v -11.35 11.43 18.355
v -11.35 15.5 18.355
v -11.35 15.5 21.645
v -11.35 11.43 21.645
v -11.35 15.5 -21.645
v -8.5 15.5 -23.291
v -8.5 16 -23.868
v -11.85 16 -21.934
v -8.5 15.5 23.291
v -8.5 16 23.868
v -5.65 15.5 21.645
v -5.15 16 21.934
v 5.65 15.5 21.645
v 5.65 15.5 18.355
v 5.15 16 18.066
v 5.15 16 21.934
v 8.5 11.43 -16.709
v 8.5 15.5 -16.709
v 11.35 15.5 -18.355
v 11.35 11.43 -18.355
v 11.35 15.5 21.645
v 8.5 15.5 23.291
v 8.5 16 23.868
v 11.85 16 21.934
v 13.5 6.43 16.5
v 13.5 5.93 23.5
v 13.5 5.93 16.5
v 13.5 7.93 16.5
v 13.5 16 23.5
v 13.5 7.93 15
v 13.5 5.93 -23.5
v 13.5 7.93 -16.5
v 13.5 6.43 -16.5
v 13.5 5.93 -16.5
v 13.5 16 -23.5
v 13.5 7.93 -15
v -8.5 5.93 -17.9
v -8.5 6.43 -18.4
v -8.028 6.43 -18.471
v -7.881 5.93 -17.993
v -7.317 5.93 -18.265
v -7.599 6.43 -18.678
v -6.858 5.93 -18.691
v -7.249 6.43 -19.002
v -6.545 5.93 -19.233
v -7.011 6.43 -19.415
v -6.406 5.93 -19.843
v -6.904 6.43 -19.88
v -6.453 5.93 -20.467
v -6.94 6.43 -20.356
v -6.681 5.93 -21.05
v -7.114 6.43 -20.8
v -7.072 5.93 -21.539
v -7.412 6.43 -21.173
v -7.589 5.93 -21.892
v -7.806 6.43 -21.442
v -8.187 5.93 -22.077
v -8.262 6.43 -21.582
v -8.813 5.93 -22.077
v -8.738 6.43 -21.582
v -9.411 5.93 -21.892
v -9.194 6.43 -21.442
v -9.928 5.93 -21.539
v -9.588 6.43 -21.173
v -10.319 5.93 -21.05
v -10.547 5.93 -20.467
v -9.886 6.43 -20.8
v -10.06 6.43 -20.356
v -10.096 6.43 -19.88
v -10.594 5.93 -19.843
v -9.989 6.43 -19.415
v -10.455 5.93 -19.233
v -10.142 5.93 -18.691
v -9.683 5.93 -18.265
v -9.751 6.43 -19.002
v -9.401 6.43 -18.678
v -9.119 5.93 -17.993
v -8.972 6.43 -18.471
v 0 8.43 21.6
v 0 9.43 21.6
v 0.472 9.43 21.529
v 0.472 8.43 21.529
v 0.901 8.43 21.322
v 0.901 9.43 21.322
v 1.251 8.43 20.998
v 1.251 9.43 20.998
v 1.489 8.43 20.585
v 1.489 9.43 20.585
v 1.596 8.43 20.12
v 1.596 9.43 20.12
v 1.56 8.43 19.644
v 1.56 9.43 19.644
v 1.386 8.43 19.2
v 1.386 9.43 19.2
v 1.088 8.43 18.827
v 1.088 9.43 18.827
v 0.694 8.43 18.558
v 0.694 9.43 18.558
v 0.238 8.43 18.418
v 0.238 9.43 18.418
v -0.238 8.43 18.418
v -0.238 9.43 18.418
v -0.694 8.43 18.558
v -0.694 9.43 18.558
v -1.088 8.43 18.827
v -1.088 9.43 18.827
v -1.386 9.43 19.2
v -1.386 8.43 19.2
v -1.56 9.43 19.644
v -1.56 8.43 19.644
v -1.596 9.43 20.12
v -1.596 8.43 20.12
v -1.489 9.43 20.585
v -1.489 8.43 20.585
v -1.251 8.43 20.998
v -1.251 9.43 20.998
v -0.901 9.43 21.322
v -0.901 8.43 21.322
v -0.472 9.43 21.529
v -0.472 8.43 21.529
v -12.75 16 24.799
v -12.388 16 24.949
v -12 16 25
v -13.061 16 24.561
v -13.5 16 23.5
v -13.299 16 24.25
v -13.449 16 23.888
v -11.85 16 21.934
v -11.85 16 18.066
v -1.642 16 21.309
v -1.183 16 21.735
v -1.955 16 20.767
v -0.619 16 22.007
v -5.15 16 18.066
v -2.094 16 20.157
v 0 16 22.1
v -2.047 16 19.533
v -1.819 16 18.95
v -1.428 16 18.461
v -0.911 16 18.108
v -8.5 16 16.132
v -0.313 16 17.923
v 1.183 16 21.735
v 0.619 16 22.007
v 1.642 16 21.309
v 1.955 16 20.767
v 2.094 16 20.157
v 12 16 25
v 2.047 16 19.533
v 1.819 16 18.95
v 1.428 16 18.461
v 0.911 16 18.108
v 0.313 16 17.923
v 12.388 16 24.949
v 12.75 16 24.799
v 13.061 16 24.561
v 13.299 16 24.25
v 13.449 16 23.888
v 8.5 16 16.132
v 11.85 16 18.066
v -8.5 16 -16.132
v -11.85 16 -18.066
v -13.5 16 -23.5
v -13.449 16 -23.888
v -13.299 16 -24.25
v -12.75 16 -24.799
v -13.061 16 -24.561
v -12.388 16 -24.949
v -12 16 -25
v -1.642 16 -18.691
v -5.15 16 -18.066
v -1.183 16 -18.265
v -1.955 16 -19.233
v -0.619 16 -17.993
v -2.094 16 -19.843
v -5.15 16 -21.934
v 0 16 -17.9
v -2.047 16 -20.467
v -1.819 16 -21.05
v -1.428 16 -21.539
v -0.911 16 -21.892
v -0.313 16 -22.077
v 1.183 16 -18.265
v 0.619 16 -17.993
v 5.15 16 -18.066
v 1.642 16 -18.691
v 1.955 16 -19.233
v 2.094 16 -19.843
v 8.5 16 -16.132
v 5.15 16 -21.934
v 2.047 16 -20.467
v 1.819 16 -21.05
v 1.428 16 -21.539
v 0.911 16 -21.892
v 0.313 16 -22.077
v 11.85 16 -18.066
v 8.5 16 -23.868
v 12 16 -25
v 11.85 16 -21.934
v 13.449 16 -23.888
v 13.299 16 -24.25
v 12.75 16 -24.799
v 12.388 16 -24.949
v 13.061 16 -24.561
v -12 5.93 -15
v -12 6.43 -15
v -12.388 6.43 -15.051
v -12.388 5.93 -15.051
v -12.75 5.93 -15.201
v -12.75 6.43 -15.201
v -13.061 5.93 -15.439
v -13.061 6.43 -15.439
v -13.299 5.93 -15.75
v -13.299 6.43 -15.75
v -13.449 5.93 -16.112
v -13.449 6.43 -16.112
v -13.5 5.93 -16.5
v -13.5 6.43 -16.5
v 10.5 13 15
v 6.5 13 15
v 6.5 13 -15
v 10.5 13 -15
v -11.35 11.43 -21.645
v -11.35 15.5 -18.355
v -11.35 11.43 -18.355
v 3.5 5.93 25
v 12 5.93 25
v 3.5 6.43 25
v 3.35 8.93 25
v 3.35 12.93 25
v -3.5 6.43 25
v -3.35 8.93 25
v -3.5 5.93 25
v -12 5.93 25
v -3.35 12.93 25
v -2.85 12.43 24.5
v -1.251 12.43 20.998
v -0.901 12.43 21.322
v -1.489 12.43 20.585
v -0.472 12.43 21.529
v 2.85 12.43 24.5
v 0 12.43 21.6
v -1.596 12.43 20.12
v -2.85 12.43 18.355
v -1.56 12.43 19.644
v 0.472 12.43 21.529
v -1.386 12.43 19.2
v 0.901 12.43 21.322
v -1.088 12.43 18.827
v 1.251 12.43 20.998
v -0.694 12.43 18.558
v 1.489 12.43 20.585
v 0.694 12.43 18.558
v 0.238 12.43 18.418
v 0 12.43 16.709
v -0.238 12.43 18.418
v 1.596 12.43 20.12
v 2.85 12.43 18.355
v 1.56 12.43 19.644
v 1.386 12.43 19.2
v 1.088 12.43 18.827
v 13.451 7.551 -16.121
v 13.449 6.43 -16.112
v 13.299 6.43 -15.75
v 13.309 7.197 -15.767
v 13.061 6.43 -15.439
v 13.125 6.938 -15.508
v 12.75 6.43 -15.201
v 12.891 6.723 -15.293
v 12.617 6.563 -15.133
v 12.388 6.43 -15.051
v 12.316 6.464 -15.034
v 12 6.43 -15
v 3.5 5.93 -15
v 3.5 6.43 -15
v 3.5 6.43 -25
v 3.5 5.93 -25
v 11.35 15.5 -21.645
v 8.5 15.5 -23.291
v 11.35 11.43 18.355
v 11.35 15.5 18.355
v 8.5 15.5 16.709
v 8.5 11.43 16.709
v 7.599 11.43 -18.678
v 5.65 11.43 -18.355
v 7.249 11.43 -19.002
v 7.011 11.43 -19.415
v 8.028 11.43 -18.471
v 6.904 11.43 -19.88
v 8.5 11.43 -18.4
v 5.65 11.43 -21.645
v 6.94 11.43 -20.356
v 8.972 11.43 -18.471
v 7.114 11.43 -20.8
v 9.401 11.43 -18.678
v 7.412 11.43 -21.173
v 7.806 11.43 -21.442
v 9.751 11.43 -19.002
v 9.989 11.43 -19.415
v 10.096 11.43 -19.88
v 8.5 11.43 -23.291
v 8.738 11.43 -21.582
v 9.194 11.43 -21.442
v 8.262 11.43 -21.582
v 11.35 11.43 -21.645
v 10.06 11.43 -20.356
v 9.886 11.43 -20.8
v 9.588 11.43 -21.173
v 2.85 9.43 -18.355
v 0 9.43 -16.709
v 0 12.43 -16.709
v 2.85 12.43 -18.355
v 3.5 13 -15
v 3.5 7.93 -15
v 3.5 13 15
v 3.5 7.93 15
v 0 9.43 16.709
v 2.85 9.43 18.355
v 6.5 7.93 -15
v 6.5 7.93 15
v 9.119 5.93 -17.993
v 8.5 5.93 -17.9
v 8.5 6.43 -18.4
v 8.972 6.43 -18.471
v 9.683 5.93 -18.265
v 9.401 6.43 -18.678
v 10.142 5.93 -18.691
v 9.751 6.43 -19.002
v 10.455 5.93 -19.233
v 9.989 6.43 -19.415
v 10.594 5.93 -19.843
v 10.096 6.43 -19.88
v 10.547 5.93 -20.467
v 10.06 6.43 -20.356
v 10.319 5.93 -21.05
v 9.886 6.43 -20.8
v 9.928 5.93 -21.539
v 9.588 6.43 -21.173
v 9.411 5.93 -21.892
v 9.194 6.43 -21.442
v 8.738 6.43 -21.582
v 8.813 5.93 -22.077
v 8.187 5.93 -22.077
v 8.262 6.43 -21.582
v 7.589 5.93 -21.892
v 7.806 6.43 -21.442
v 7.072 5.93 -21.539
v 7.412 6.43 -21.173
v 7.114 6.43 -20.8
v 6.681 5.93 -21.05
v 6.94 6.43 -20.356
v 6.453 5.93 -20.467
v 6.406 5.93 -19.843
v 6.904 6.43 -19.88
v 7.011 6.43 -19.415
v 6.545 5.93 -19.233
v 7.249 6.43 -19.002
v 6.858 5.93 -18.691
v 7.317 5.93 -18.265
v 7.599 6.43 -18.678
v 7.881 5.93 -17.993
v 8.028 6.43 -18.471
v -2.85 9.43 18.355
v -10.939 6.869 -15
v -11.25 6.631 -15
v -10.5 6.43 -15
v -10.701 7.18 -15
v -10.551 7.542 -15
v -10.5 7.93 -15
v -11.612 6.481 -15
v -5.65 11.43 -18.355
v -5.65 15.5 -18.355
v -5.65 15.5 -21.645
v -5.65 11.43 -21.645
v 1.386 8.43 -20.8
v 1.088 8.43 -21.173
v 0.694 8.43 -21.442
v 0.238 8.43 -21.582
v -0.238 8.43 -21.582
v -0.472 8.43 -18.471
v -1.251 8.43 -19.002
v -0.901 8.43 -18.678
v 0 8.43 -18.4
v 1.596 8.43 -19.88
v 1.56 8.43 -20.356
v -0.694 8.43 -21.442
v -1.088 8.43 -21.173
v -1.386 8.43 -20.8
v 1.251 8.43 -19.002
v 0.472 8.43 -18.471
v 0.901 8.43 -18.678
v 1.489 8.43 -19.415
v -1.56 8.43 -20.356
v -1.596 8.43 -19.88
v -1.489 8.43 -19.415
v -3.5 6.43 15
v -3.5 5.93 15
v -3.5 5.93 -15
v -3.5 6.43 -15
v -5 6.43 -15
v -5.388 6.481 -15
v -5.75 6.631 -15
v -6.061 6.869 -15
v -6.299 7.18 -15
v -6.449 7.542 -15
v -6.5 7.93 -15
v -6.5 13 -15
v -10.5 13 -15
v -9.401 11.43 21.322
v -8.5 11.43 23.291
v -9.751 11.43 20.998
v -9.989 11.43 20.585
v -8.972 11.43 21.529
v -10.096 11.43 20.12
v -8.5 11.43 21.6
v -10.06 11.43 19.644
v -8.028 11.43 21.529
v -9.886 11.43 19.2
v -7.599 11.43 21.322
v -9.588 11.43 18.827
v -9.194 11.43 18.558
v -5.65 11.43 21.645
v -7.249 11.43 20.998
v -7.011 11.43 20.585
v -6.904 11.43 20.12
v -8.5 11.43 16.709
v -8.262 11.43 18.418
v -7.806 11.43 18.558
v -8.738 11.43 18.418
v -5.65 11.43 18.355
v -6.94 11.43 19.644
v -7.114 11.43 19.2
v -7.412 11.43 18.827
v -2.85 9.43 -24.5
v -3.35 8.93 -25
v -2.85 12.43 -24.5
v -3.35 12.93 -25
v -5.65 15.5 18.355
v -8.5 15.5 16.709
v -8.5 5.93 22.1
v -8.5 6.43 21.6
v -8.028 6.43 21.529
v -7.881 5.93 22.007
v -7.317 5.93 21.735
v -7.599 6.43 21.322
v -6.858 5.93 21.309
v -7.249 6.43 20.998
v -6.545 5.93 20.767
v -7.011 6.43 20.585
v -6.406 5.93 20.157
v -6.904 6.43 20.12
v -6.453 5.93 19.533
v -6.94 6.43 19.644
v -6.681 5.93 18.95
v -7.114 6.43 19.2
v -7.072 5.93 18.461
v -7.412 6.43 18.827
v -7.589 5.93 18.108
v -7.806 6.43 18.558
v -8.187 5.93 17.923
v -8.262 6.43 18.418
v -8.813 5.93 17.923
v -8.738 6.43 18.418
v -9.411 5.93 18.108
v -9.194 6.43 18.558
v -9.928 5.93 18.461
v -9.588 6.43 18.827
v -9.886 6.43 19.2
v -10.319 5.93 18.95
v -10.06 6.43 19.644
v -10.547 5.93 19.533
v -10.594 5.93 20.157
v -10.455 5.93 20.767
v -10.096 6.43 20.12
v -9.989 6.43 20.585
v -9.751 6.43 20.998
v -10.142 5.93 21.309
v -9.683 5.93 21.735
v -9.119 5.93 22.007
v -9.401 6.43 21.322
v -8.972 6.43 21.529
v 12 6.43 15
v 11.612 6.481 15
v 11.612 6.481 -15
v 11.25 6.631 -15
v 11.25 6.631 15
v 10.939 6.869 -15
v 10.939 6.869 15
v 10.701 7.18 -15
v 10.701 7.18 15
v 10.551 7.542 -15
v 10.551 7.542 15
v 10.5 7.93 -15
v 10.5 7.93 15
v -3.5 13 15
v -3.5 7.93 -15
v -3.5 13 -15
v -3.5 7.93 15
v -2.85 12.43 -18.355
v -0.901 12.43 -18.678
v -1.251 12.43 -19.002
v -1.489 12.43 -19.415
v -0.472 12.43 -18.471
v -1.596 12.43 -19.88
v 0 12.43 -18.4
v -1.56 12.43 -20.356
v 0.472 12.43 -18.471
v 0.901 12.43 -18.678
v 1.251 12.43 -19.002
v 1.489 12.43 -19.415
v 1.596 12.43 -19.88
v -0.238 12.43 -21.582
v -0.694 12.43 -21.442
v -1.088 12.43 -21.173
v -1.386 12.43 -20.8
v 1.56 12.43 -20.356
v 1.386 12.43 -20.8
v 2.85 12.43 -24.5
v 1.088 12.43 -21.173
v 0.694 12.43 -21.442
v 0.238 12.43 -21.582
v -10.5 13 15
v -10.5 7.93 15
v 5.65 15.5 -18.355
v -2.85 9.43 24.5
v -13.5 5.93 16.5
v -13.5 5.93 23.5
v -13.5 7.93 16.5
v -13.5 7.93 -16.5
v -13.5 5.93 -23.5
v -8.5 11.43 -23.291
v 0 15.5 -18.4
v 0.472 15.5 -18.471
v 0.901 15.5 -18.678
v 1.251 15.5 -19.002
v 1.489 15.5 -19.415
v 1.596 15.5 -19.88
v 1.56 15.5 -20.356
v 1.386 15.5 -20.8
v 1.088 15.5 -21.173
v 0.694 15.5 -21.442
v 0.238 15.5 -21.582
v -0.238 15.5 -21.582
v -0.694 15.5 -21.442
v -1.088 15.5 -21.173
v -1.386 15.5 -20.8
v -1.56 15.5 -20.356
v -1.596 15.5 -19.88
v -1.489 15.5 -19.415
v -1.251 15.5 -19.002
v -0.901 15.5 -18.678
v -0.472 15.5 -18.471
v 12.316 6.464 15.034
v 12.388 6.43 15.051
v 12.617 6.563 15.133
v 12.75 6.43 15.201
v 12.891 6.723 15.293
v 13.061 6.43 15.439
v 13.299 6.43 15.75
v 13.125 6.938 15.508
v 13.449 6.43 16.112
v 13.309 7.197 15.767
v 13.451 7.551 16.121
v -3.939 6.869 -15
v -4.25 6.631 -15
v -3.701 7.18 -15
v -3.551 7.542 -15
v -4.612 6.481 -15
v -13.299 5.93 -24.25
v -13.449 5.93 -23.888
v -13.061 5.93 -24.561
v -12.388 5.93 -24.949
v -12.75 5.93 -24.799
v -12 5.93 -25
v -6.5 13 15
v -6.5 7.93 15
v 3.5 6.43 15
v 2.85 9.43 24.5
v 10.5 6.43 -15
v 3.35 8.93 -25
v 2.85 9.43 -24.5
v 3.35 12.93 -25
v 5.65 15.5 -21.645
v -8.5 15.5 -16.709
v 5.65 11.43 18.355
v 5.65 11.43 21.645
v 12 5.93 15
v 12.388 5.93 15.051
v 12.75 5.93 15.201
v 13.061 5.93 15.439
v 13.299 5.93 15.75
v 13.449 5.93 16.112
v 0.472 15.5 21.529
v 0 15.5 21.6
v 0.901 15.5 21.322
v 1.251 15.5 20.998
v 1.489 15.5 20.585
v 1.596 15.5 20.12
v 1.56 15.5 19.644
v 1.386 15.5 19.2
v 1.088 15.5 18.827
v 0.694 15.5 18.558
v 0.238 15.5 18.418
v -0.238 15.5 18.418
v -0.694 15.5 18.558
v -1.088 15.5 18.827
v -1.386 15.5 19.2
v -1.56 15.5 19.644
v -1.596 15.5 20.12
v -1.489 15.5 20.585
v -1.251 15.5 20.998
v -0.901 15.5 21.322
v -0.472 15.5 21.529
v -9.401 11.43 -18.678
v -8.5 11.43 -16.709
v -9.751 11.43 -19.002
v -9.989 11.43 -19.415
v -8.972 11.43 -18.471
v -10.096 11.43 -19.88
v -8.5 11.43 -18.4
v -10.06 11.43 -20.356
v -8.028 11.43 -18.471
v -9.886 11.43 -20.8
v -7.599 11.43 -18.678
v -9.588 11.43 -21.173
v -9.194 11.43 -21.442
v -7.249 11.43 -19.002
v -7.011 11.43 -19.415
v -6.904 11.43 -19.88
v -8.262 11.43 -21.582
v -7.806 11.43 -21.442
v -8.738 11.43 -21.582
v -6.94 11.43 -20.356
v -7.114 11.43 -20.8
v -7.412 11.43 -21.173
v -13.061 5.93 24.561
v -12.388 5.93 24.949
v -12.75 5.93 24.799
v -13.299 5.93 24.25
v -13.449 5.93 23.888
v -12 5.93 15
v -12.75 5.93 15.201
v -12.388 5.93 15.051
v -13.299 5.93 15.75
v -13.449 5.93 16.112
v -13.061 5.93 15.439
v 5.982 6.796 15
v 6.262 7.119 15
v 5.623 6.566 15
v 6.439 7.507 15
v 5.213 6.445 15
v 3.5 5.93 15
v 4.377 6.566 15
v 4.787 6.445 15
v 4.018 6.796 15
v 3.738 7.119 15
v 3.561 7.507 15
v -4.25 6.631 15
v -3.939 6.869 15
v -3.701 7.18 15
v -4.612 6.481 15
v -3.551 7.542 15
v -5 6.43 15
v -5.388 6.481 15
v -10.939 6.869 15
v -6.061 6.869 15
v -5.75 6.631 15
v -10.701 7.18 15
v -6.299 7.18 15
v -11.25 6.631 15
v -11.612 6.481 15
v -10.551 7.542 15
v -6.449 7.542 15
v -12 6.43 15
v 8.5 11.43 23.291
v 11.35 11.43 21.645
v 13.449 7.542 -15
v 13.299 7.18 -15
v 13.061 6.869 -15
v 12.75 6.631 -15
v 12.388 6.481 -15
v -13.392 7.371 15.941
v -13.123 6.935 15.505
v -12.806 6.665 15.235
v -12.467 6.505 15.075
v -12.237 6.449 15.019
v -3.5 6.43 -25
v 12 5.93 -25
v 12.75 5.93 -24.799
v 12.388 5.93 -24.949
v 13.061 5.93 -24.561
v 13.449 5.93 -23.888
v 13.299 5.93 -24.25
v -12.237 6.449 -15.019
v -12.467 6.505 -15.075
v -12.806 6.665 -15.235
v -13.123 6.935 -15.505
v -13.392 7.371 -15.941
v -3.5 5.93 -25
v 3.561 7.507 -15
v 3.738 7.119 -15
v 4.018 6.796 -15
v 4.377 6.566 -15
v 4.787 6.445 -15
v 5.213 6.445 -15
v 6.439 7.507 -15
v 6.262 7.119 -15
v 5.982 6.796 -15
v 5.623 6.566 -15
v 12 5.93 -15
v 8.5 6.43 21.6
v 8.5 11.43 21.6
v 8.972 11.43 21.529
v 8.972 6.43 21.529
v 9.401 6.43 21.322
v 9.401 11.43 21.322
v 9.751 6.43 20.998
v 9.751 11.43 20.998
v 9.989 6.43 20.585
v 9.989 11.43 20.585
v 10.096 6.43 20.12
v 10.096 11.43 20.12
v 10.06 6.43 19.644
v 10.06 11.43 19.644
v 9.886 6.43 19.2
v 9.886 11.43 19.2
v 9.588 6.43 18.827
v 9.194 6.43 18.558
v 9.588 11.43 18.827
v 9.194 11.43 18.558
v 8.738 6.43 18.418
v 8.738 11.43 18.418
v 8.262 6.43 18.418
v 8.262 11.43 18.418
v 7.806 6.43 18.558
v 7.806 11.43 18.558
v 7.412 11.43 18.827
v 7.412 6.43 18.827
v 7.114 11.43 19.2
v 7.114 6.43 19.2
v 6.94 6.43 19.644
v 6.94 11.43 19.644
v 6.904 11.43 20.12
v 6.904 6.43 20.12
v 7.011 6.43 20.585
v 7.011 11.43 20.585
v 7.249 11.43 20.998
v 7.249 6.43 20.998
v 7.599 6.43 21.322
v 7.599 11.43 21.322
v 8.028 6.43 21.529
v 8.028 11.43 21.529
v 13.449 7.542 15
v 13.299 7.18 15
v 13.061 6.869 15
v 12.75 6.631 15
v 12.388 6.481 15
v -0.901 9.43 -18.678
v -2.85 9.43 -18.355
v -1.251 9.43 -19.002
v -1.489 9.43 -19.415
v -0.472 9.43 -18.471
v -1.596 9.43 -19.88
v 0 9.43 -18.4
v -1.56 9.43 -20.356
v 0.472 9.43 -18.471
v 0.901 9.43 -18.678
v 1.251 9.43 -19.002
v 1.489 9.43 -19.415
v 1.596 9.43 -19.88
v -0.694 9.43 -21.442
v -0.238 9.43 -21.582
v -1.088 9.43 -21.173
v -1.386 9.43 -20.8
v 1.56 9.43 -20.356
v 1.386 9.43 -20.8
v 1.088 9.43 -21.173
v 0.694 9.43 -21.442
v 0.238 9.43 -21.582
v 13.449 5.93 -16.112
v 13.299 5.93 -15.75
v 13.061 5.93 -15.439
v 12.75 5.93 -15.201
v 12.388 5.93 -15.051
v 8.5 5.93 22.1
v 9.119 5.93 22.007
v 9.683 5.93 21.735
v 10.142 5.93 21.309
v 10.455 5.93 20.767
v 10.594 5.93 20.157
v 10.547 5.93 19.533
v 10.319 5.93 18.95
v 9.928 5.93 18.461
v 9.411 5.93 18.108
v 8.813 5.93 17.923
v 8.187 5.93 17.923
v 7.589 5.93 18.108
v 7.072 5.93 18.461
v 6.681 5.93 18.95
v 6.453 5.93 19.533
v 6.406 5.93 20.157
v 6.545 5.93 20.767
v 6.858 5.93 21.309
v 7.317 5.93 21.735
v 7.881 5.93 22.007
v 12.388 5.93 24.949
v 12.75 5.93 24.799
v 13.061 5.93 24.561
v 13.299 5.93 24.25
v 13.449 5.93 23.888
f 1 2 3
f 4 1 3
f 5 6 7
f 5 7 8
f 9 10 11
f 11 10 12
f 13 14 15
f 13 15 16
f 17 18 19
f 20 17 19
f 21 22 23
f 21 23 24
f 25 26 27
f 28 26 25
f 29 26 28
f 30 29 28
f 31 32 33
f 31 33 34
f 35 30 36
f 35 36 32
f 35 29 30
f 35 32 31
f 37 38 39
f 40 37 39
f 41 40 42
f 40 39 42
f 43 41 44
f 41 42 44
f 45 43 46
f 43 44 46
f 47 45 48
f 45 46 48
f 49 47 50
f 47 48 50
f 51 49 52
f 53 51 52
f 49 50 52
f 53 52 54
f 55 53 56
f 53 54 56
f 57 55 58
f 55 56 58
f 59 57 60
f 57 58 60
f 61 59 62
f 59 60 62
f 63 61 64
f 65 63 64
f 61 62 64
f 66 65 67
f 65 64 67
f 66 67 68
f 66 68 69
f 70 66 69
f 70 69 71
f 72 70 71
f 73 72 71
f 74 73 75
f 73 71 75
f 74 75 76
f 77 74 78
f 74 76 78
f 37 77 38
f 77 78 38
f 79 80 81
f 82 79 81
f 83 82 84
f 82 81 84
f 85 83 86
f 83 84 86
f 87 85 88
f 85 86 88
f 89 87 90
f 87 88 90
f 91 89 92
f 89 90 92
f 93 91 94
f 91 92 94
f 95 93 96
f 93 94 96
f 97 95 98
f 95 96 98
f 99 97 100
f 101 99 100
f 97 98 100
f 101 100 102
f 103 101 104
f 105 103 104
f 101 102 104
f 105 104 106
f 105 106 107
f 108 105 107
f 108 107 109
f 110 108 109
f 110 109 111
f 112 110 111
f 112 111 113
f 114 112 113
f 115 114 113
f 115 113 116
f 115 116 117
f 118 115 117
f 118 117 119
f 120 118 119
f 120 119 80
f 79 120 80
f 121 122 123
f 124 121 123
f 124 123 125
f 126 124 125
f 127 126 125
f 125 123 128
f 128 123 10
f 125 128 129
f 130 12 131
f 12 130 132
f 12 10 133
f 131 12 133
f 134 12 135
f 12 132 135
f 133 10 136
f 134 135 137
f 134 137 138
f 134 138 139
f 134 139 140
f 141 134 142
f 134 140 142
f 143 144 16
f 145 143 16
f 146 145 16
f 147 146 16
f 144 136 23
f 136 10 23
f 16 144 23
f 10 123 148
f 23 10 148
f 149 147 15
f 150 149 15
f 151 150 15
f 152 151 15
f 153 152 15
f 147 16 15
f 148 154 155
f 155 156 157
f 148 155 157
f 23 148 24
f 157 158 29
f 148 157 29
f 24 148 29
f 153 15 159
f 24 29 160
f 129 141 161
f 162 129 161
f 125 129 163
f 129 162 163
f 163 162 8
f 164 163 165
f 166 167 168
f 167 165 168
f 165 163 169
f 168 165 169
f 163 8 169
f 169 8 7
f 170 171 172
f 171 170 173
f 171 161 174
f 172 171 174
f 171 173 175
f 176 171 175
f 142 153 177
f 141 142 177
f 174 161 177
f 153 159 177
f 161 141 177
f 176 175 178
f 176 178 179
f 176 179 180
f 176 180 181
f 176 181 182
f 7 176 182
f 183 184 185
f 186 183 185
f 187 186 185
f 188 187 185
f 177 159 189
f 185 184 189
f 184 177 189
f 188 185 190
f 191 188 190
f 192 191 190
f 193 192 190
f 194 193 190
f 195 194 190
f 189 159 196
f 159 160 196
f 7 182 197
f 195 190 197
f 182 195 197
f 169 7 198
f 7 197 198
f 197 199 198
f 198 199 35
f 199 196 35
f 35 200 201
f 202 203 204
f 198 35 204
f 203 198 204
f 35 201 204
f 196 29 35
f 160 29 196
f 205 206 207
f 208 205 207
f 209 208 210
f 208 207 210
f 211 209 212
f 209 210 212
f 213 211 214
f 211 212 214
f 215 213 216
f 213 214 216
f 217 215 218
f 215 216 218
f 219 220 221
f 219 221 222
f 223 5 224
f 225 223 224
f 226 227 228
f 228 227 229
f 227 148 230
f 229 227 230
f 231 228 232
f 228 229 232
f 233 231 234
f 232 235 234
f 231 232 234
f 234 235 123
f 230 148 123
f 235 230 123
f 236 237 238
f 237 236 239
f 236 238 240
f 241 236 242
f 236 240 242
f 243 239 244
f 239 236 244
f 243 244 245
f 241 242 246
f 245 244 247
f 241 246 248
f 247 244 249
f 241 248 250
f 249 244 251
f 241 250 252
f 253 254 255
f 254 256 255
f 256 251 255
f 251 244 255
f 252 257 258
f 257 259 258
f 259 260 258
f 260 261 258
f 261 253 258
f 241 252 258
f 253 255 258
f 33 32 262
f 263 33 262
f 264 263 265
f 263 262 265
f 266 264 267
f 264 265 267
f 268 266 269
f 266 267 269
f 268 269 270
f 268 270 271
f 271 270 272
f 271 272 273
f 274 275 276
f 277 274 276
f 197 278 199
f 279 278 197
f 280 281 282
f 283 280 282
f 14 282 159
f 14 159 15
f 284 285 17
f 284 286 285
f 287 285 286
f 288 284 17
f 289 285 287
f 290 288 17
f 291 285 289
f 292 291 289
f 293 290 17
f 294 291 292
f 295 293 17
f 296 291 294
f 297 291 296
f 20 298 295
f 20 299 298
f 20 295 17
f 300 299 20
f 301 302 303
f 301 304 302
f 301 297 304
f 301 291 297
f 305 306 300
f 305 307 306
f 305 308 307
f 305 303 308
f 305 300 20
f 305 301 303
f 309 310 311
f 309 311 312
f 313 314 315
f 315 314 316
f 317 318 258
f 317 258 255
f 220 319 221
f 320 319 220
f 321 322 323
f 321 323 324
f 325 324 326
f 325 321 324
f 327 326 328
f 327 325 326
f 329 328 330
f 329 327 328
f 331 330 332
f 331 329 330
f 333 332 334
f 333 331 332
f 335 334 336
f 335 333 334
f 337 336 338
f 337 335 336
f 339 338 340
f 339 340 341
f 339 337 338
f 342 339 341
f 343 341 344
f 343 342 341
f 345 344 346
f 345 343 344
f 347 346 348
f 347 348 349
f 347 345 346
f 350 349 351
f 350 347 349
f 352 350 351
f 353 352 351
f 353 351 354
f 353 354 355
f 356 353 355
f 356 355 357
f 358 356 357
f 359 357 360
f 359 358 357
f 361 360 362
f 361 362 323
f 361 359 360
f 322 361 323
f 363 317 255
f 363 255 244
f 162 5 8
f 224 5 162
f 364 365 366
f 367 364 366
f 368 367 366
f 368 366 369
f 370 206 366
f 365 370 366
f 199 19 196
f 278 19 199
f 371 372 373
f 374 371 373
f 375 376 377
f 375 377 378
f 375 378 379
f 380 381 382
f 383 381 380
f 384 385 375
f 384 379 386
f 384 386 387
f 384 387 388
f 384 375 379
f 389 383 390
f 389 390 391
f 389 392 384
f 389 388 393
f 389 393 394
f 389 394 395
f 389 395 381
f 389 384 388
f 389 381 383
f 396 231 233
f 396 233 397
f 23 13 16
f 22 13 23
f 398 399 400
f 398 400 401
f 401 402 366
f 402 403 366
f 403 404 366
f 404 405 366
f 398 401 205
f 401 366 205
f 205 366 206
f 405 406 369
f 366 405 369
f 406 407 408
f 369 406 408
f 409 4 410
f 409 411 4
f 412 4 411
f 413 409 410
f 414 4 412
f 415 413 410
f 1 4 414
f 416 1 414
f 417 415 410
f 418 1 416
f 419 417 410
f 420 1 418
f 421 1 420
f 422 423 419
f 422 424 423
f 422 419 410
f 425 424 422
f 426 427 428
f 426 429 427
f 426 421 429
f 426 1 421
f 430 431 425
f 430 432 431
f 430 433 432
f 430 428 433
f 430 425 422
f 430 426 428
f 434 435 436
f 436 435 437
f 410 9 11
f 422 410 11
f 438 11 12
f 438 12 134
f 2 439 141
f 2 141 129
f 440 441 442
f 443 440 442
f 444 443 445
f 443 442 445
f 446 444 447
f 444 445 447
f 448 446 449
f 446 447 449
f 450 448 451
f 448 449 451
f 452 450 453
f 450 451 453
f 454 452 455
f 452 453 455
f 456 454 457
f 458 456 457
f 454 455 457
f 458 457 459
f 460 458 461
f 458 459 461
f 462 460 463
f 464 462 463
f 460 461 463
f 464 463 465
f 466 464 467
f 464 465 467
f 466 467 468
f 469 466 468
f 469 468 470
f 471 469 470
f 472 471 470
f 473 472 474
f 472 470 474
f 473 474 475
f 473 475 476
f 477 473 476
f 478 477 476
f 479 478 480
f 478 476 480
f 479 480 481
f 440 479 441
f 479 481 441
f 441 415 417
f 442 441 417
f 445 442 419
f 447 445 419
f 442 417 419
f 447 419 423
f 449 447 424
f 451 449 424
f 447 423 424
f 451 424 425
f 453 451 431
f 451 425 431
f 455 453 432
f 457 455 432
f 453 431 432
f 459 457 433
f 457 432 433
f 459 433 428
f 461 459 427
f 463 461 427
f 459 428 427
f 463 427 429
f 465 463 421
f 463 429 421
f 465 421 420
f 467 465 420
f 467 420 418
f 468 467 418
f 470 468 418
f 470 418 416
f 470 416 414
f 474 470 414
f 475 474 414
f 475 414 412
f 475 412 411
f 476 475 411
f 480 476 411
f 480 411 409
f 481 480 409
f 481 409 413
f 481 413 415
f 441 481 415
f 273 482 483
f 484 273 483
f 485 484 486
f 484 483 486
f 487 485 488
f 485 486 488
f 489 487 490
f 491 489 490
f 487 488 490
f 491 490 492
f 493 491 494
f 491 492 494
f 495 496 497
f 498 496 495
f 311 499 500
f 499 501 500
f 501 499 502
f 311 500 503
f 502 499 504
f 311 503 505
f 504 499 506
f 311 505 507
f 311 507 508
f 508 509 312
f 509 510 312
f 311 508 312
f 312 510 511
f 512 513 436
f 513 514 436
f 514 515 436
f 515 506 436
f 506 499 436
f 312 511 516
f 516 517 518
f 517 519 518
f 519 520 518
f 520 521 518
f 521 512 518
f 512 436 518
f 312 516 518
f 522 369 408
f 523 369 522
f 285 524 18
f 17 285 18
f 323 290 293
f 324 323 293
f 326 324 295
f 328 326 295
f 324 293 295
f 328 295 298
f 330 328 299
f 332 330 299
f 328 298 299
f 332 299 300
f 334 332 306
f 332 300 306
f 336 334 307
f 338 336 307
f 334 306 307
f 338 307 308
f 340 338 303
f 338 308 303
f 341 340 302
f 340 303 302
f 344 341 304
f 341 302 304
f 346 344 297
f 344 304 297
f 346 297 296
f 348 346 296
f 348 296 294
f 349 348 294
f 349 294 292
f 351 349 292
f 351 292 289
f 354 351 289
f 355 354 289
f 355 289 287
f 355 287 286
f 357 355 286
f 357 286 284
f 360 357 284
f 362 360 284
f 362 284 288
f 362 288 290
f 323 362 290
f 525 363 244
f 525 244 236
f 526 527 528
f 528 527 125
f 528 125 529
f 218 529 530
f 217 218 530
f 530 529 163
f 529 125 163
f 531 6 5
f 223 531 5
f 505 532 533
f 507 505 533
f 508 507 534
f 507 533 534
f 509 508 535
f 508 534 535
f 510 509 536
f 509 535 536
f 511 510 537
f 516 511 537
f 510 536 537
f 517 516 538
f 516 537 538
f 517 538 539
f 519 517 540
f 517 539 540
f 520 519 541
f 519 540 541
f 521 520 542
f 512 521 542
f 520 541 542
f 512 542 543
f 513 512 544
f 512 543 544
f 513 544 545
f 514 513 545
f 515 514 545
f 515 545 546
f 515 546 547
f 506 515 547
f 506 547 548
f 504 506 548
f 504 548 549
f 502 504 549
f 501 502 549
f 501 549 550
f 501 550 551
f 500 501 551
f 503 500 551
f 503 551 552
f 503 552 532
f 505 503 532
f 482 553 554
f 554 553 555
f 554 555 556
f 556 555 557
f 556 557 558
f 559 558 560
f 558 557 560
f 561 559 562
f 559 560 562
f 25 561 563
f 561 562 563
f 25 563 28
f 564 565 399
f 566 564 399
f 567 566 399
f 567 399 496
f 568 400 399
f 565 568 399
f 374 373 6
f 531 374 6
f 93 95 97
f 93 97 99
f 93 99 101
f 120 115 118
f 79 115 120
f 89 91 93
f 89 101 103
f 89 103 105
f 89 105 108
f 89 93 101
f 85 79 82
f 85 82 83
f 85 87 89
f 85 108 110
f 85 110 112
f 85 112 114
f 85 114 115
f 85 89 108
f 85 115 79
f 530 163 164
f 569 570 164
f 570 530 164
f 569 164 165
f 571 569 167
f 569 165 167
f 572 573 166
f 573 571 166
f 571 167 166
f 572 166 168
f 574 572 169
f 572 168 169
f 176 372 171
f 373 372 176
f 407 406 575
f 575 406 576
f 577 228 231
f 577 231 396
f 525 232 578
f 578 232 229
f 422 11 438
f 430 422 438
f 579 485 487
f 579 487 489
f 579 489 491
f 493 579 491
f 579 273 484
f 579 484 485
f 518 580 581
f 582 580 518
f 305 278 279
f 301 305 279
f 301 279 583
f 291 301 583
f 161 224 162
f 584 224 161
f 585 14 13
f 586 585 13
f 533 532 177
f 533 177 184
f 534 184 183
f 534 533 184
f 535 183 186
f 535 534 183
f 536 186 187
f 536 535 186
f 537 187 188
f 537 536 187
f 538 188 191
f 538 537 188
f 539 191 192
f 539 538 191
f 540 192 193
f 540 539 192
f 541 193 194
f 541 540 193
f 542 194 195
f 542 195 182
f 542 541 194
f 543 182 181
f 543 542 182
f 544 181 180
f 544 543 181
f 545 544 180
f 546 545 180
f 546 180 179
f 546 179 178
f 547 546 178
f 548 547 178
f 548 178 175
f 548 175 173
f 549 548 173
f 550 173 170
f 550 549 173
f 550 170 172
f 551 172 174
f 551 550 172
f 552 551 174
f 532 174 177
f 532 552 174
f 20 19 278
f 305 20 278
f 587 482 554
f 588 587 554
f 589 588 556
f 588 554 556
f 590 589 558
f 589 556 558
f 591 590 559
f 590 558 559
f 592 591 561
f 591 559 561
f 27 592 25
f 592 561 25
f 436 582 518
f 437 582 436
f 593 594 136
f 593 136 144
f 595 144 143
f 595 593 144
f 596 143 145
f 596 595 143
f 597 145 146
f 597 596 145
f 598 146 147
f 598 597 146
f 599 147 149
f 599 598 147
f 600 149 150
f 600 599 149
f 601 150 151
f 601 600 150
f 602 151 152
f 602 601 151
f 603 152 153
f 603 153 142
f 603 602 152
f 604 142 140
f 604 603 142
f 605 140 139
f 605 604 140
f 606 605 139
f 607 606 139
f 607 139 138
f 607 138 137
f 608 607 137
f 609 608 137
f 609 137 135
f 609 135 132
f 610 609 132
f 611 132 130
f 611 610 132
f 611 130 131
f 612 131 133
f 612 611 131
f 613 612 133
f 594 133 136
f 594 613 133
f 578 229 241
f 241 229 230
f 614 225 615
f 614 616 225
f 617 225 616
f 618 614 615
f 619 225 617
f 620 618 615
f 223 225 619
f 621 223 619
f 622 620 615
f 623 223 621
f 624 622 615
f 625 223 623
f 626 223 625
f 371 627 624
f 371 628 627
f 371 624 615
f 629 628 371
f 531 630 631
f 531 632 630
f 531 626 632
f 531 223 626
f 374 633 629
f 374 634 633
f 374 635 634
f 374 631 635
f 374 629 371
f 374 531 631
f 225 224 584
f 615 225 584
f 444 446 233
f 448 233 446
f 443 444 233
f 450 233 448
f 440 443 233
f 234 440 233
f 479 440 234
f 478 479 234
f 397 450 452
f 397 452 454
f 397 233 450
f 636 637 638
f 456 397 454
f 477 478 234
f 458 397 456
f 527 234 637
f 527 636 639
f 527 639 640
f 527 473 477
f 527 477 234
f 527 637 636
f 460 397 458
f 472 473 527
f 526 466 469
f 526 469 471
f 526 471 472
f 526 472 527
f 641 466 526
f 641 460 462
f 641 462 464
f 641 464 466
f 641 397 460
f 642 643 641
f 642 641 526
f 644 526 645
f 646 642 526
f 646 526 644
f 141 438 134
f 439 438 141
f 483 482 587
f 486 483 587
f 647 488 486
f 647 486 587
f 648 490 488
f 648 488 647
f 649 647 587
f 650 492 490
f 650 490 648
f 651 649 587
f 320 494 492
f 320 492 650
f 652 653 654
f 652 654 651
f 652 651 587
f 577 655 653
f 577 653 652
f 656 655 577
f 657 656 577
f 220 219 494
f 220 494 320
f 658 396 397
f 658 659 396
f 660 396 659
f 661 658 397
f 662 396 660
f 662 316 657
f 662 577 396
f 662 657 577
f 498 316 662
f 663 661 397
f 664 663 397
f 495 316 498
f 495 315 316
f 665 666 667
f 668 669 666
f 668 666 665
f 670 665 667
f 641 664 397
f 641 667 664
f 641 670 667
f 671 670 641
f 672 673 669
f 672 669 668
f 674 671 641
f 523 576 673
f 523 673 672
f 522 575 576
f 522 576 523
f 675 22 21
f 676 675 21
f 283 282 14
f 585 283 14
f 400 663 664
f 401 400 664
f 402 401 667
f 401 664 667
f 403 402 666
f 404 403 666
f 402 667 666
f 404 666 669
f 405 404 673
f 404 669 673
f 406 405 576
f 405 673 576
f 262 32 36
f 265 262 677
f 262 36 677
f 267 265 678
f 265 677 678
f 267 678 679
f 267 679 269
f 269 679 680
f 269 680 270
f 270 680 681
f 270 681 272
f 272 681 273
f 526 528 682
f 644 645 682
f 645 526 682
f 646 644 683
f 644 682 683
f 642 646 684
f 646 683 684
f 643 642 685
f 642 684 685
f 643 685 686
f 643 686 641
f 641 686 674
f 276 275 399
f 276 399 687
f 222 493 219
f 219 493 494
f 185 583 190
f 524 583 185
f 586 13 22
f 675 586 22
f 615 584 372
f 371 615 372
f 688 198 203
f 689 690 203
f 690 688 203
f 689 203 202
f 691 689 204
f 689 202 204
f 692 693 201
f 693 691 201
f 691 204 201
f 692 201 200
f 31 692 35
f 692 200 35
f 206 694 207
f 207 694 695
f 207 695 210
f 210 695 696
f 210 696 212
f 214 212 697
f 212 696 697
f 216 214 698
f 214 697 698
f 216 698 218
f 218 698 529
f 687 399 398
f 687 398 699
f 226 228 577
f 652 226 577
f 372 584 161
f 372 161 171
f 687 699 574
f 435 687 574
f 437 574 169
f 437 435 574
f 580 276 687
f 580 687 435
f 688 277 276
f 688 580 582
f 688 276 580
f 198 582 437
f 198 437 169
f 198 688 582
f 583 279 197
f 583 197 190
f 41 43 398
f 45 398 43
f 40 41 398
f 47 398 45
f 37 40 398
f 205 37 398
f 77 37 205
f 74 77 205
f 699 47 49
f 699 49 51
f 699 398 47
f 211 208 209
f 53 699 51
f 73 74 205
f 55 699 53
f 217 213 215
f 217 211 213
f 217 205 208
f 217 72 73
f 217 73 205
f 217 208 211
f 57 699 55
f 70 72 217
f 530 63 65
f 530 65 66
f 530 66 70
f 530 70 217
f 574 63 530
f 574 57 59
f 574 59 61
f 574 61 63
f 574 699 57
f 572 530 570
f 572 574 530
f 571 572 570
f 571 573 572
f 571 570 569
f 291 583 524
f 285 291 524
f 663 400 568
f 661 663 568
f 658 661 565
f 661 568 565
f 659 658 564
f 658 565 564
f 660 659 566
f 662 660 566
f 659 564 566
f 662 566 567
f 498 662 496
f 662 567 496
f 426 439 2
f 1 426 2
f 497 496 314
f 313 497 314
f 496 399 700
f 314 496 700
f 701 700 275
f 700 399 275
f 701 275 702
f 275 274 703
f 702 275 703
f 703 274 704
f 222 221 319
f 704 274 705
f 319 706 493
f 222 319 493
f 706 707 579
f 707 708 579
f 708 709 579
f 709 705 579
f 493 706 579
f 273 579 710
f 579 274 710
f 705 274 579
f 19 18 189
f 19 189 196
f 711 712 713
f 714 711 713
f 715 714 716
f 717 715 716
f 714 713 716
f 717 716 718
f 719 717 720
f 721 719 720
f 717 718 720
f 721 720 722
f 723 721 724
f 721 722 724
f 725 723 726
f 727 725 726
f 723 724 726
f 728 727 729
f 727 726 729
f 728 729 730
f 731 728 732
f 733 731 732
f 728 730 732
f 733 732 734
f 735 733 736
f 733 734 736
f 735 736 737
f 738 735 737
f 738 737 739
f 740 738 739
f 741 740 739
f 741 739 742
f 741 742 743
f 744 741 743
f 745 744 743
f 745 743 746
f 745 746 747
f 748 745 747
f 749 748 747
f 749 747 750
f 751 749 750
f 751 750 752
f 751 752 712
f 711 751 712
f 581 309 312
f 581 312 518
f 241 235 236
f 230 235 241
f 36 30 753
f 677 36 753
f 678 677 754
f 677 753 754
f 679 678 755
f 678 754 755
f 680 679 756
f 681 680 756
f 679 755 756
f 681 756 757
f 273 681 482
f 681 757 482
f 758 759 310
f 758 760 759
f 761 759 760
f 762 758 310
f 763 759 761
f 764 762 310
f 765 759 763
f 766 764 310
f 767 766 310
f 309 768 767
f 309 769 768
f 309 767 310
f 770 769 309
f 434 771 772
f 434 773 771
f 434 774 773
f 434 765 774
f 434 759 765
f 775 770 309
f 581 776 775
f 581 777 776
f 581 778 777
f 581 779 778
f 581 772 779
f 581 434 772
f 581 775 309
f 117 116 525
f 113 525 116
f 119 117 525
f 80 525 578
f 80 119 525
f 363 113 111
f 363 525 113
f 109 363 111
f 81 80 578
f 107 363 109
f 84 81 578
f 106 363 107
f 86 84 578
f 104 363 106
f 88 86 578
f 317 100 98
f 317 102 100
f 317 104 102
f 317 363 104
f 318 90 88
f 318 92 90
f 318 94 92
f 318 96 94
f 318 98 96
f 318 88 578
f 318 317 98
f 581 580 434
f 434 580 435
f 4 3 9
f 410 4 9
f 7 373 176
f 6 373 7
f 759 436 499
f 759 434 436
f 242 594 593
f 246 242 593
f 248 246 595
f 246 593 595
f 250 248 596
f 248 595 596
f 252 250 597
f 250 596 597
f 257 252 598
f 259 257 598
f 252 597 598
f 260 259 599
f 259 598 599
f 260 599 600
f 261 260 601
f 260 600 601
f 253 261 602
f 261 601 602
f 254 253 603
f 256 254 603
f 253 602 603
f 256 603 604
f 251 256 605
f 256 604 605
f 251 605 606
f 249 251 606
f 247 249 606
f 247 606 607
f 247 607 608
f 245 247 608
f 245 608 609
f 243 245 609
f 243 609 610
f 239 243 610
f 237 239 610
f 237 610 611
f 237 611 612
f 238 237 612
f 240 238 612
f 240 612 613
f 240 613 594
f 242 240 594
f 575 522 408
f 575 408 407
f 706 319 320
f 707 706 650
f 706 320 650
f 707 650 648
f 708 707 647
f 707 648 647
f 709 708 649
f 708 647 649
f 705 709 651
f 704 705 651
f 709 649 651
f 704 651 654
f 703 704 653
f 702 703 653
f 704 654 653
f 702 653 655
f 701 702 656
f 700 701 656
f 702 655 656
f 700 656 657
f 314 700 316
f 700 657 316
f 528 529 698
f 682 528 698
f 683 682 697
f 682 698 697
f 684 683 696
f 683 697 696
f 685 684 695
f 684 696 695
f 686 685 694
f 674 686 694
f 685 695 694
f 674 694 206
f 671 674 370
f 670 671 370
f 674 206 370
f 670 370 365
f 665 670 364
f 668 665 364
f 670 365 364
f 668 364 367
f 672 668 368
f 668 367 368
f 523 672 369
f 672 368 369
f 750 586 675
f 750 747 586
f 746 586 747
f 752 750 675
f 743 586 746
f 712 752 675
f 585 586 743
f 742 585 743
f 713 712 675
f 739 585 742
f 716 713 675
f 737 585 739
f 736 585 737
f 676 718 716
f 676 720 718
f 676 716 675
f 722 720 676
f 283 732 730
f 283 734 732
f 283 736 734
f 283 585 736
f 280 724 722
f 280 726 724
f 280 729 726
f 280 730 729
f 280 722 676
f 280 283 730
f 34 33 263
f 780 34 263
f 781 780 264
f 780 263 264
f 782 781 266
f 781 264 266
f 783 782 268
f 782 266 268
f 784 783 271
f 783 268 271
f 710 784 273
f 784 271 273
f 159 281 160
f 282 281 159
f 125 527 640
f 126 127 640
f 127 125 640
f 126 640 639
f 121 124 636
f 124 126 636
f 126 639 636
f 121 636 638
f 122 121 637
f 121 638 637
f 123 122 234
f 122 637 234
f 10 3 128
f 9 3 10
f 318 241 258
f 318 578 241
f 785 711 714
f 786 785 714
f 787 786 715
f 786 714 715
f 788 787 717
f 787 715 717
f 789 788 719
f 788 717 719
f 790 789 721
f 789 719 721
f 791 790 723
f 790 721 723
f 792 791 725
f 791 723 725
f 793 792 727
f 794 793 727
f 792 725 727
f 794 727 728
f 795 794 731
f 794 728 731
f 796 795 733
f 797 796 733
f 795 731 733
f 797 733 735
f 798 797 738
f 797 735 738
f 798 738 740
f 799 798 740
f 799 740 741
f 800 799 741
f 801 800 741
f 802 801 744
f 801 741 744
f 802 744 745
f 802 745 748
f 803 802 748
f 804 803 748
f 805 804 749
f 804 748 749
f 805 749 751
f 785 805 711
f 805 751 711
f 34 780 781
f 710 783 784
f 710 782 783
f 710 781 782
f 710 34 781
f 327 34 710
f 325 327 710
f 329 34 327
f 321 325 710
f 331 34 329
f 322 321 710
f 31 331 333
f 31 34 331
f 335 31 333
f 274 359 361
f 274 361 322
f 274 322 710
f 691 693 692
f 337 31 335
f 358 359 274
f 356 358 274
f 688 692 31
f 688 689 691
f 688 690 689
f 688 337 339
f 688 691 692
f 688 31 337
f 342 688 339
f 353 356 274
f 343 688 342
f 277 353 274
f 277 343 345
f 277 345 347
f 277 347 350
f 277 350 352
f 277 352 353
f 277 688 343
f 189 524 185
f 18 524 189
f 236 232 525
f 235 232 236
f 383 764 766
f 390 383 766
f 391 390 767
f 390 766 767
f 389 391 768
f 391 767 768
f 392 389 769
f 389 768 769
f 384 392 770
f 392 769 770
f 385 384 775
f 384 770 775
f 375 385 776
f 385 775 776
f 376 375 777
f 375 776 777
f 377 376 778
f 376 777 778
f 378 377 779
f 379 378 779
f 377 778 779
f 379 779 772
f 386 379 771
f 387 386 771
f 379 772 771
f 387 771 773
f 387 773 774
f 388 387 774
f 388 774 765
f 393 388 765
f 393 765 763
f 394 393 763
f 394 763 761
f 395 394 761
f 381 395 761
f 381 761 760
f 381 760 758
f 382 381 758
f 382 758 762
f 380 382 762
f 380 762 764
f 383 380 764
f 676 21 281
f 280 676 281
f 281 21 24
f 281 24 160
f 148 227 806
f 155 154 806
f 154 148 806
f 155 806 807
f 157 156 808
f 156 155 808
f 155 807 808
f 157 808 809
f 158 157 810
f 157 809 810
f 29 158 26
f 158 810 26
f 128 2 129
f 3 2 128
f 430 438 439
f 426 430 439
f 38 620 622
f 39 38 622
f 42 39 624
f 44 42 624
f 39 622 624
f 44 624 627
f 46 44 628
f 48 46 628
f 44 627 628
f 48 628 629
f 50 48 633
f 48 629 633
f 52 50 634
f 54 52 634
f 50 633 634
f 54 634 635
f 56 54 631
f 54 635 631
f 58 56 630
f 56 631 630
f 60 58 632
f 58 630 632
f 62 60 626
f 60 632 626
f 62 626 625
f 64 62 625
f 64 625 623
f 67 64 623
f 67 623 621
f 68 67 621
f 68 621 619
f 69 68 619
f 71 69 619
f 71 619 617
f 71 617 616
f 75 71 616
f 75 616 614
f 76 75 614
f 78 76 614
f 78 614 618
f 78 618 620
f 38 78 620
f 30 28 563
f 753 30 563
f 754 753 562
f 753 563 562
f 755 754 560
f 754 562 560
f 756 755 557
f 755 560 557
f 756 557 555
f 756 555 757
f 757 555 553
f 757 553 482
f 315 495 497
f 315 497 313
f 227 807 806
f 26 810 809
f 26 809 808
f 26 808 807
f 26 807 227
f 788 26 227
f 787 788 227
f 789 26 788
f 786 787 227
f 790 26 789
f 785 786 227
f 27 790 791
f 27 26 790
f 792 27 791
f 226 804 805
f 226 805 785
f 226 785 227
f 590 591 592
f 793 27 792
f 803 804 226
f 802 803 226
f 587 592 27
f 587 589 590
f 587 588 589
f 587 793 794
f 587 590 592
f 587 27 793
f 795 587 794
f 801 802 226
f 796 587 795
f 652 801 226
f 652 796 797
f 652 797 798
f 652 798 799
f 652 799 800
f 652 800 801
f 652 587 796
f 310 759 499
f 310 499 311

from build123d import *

# Parameters (mm, degrees)
SKETCH_1_W          = 50
SKETCH_1_H          = 9.57
EXTRUDE_1_DEPTH     = 13.5
CUT_EXTRUDE_1_DEPTH = 4.57
CUT_EXTRUDE_START   = -6.57
SKETCH_2_3_R        = 1.6
CUT_EXTRUDE_2_DEPTH = 3
SKETCH_2_5_R        = 1.6
CUT_EXTRUDE_4_DEPTH = 7.57
SKETCH_3_W          = 4
SKETCH_3_H          = 30
SKETCH_3_W_2        = 7
CUT_EXTRUDE_5_DEPTH = 6.57
SKETCH_4_W          = 10
SKETCH_4_H          = 10
EXTRUDE_2_DEPTH     = 0.5
SKETCH_2_4_R        = 1.6
CUT_EXTRUDE_3_DEPTH = 16
FILLET_1_R          = 1.5
CHAMFER_1_SIZE      = 0.5


with BuildPart() as part:
    # Эскиз1 → Бобышка-Вытянуть1 (new, symmetric)
    with BuildSketch(Plane(origin=(0, 0, 0), x_dir=(0, 0, -1), z_dir=(1, 0, 0))):
        with Locations((0, 11.215)):
            Rectangle(SKETCH_1_W, SKETCH_1_H)
    extrude(amount=EXTRUDE_1_DEPTH, both=True)

    # Эскиз2 → Вырез-Вытянуть1 (cut)
    with BuildSketch(Plane(origin=(0, 16, 0), x_dir=(1, 0, 0), z_dir=(0, 1, 0))):
        Polygon((-8.5, 16.709103466), (-5.65, 18.354551733), (-5.65, 21.645448267), (-8.5, 23.290896534), (-11.35, 21.645448267), (-11.35, 18.354551733), align=None)
        Polygon((8.5, 16.709103466), (11.35, 18.354551733), (11.35, 21.645448267), (8.5, 23.290896534), (5.65, 21.645448267), (5.65, 18.354551733), align=None)
        Polygon((8.5, -23.290896534), (11.35, -21.645448267), (11.35, -18.354551733), (8.5, -16.709103466), (5.65, -18.354551733), (5.65, -21.645448267), align=None)
        Polygon((-8.5, -16.709103466), (-11.35, -18.354551733), (-11.35, -21.645448267), (-8.5, -23.290896534), (-5.65, -21.645448267), (-5.65, -18.354551733), align=None)
    extrude(amount=-CUT_EXTRUDE_1_DEPTH, mode=Mode.SUBTRACT)

    # Эскиз2<3> → Вырез-Вытянуть2 (cut)
    # profile 1 of 6: a face of its own
    with BuildSketch(Plane(origin=(0, 16, 0), x_dir=(1, 0, 0), z_dir=(0, 1, 0)).offset(CUT_EXTRUDE_START)):
        Polygon((-2.85, 21.645448267), (-2.85, 18.354551733), (0, 16.709103466), (2.85, 18.354551733), (2.85, 21.645448267), (0, 23.290896534), align=None)
        with Locations((0, 20)):
            Circle(SKETCH_2_3_R, mode=Mode.SUBTRACT)
    # profile 2 of 6: a face of its own
    with BuildSketch(Plane(origin=(0, 16, 0), x_dir=(1, 0, 0), z_dir=(0, 1, 0)).offset(CUT_EXTRUDE_START)):
        with Locations((0, 20)):
            Circle(SKETCH_2_3_R)
    # profile 3 of 6: a face of its own
    with BuildSketch(Plane(origin=(0, 16, 0), x_dir=(1, 0, 0), z_dir=(0, 1, 0)).offset(CUT_EXTRUDE_START)):
        Polygon((-2.85, 25), (-2.85, 21.645448267), (0, 23.290896534), (2.85, 21.645448267), (2.85, 25), align=None)
    # profile 4 of 6: a face of its own
    with BuildSketch(Plane(origin=(0, 16, 0), x_dir=(1, 0, 0), z_dir=(0, 1, 0)).offset(CUT_EXTRUDE_START)):
        Polygon((-2.85, -18.354551733), (-2.85, -21.645448267), (0, -23.290896534), (2.85, -21.645448267), (2.85, -18.354551733), (0, -16.709103466), align=None)
        with Locations((0, -20)):
            Circle(SKETCH_2_3_R, mode=Mode.SUBTRACT)
    # profile 5 of 6: a face of its own
    with BuildSketch(Plane(origin=(0, 16, 0), x_dir=(1, 0, 0), z_dir=(0, 1, 0)).offset(CUT_EXTRUDE_START)):
        with Locations((0, -20)):
            Circle(SKETCH_2_3_R)
    # profile 6 of 6: a face of its own
    with BuildSketch(Plane(origin=(0, 16, 0), x_dir=(1, 0, 0), z_dir=(0, 1, 0)).offset(CUT_EXTRUDE_START)):
        Polygon((2.85, -21.645448267), (0, -23.290896534), (-2.85, -21.645448267), (-2.85, -25), (2.85, -25), align=None)
    extrude(amount=CUT_EXTRUDE_2_DEPTH, mode=Mode.SUBTRACT)

    # Эскиз2<5> → Вырез-Вытянуть4 (cut)
    with BuildSketch(Plane(origin=(0, 16, 0), x_dir=(1, 0, 0), z_dir=(0, 1, 0))):
        with Locations(Location((0, -20, 0), (0, 0, 270))):
            Circle(SKETCH_2_5_R)
        with Locations(Location((0, 20, 0), (0, 0, 270))):
            Circle(SKETCH_2_5_R)
    extrude(amount=-CUT_EXTRUDE_4_DEPTH, mode=Mode.SUBTRACT)

    # Эскиз3 → Вырез-Вытянуть5 (cut)
    with BuildSketch(Plane.XZ.offset(-6.43)):
        with Locations((-8.5, 0)):
            Rectangle(SKETCH_3_W, SKETCH_3_H)
        Rectangle(SKETCH_3_W_2, SKETCH_3_H)
        with Locations((8.5, 0)):
            Rectangle(SKETCH_3_W, SKETCH_3_H)
    extrude(amount=-CUT_EXTRUDE_5_DEPTH, mode=Mode.SUBTRACT)

    # Эскиз4 → Бобышка-Вытянуть2 (add)
    with BuildSketch(Plane(origin=(0, 6.43, 0), x_dir=(-1, 0, 0), z_dir=(0, -1, 0))):
        with Locations((8.5, -20)):
            Rectangle(SKETCH_4_W, SKETCH_4_H)
        with Locations((-8.5, -20)):
            Rectangle(SKETCH_4_W, SKETCH_4_H)
        with Locations((8.5, 20)):
            Rectangle(SKETCH_4_W, SKETCH_4_H)
        with Locations((-8.5, 20)):
            Rectangle(SKETCH_4_W, SKETCH_4_H)
    extrude(amount=EXTRUDE_2_DEPTH)

    # Эскиз2<4> → Вырез-Вытянуть3 (cut)
    with BuildSketch(Plane(origin=(0, 16, 0), x_dir=(1, 0, 0), z_dir=(0, 1, 0))):
        with Locations(Location((8.5, 20, 0), (0, 0, 270))):
            Circle(SKETCH_2_4_R)
        with Locations(Location((-8.5, 20, 0), (0, 0, 270))):
            Circle(SKETCH_2_4_R)
        with Locations(Location((8.5, -20, 0), (0, 0, 270))):
            Circle(SKETCH_2_4_R)
        with Locations(Location((-8.5, -20, 0), (0, 0, 270))):
            Circle(SKETCH_2_4_R)
    extrude(amount=-CUT_EXTRUDE_3_DEPTH, mode=Mode.SUBTRACT)

    # Скругление1
    # the kernel refuses this fillet: 1.5 mm, written as the material it takes off along each edge
    with BuildSketch(Plane(origin=(-13.5, 2.18, 25), x_dir=(0, 0, -1), z_dir=(0, 1, 0)), Plane(origin=(13.5, 2.18, 25), x_dir=(-1, 0, 0), z_dir=(0, 1, 0)), Plane(origin=(-13.5, 19.75, -25), x_dir=(0, 0, 1), z_dir=(0, -1, 0)), Plane(origin=(13.5, 19.75, -25), x_dir=(-1, 0, 0), z_dir=(0, -1, 0))) as fillet_1_piece_1:
        with BuildLine():
            CenterArc((FILLET_1_R, -FILLET_1_R), FILLET_1_R, 90, 90)
            Line((0, -FILLET_1_R), (0, 0))
            Line((0, 0), (FILLET_1_R, 0))
        make_face()
    extrude(amount=17.57, mode=Mode.SUBTRACT)
    with BuildSketch(Plane(origin=(13.5, 6.43, 15), x_dir=(0, 0, 1), z_dir=(0, -1, 0)), Plane(origin=(-13.5, 6.43, 15), x_dir=(1, 0, 0), z_dir=(0, -1, 0))) as fillet_1_piece_2:
        with BuildLine():
            CenterArc((FILLET_1_R, FILLET_1_R), FILLET_1_R, 180, 90)
            Line((0, FILLET_1_R), (0, 0))
            Line((0, 0), (FILLET_1_R, 0))
        make_face()
    extrude(amount=4.25, mode=Mode.SUBTRACT)
    with BuildSketch(Plane(origin=(13.5, 6.43, -15), x_dir=(0, 0, -1), z_dir=(0, -1, 0)), Plane(origin=(-13.5, 6.43, -15), x_dir=(1, 0, 0), z_dir=(0, -1, 0))) as fillet_1_piece_3:
        with BuildLine():
            CenterArc((FILLET_1_R, -FILLET_1_R), FILLET_1_R, 90, 90)
            Line((0, -FILLET_1_R), (0, 0))
            Line((0, 0), (FILLET_1_R, 0))
        make_face()
    extrude(amount=4.25, mode=Mode.SUBTRACT)
    with BuildSketch(Plane(origin=(6.5, 6.43, -15), x_dir=(0, 1, 0), z_dir=(0, 0, 1)), Plane(origin=(3.5, 6.43, 15), x_dir=(0, 1, 0), z_dir=(0, 0, -1)), Plane(origin=(-6.5, 6.43, 15), x_dir=(0, 1, 0), z_dir=(0, 0, -1))) as fillet_1_piece_4:
        with BuildLine():
            CenterArc((FILLET_1_R, FILLET_1_R), FILLET_1_R, 180, 90)
            Line((0, FILLET_1_R), (0, 0))
            Line((0, 0), (FILLET_1_R, 0))
        make_face()
    extrude(amount=30, mode=Mode.SUBTRACT)
    with BuildSketch(Plane(origin=(13.5, 6.43, 15), x_dir=(0, 1, 0), z_dir=(0, 0, -1)), Plane(origin=(10.5, 6.43, 15), x_dir=(1, 0, 0), z_dir=(0, 0, -1)), Plane(origin=(-3.5, 6.43, -15), x_dir=(-1, 0, 0), z_dir=(0, 0, 1)), Plane(origin=(-10.5, 6.43, -15), x_dir=(-1, 0, 0), z_dir=(0, 0, 1)), Plane(origin=(-13.5, 6.43, 15), x_dir=(1, 0, 0), z_dir=(0, 0, -1))) as fillet_1_piece_5:
        with BuildLine():
            CenterArc((FILLET_1_R, -FILLET_1_R), FILLET_1_R, 90, 90)
            Line((0, -FILLET_1_R), (0, 0))
            Line((0, 0), (FILLET_1_R, 0))
        make_face()
    extrude(amount=30, mode=Mode.SUBTRACT)
    with BuildSketch(Plane(origin=(13.5, 6.43, 18.75), x_dir=(0, 1, 0), z_dir=(0, 0, -1))) as fillet_1_piece_6a_section:
        with BuildLine():
            CenterArc((FILLET_1_R, -FILLET_1_R), FILLET_1_R, 90, 90)
            Line((0, -FILLET_1_R), (0, 0))
            Line((0, 0), (FILLET_1_R, 0))
        make_face()
    fillet_1_piece_6a = extrude(amount=33.75, mode=Mode.PRIVATE)
    fillet_1_piece_6a = split(fillet_1_piece_6a, bisect_by=Plane(origin=(13.160407329, 6.769592671, 15), z_dir=(0, 0, 1)), keep=Keep.TOP, mode=Mode.PRIVATE)
    with BuildSketch(Plane(origin=(13.5, 10.18, 15), x_dir=(0, 0, 1), z_dir=(0, -1, 0))) as fillet_1_piece_6b_section:
        with BuildLine():
            CenterArc((FILLET_1_R, FILLET_1_R), FILLET_1_R, 180, 90)
            Line((0, FILLET_1_R), (0, 0))
            Line((0, 0), (FILLET_1_R, 0))
        make_face()
    fillet_1_piece_6b = extrude(amount=8, mode=Mode.PRIVATE)
    fillet_1_piece_6b = split(fillet_1_piece_6b, bisect_by=Plane(origin=(13.160407329, 6.43, 15.339592671), z_dir=(0, 1, 0)), keep=Keep.TOP, mode=Mode.PRIVATE)
    fillet_1_piece_6 = fillet_1_piece_6a & fillet_1_piece_6b
    add(fillet_1_piece_6, mode=Mode.SUBTRACT)
    with BuildSketch(Plane(origin=(13.5, 6.43, 15), x_dir=(0, 1, 0), z_dir=(0, 0, -1))) as fillet_1_piece_7a_section:
        with BuildLine():
            CenterArc((FILLET_1_R, -FILLET_1_R), FILLET_1_R, 90, 90)
            Line((0, -FILLET_1_R), (0, 0))
            Line((0, 0), (FILLET_1_R, 0))
        make_face()
    fillet_1_piece_7a = extrude(amount=33.75, mode=Mode.PRIVATE)
    fillet_1_piece_7a = split(fillet_1_piece_7a, bisect_by=Plane(origin=(13.160407329, 6.769592671, -15), z_dir=(0, 0, -1)), keep=Keep.TOP, mode=Mode.PRIVATE)
    with BuildSketch(Plane(origin=(13.5, 10.18, -15), x_dir=(0, 0, -1), z_dir=(0, -1, 0))) as fillet_1_piece_7b_section:
        with BuildLine():
            CenterArc((FILLET_1_R, -FILLET_1_R), FILLET_1_R, 90, 90)
            Line((0, -FILLET_1_R), (0, 0))
            Line((0, 0), (FILLET_1_R, 0))
        make_face()
    fillet_1_piece_7b = extrude(amount=8, mode=Mode.PRIVATE)
    fillet_1_piece_7b = split(fillet_1_piece_7b, bisect_by=Plane(origin=(13.160407329, 6.43, -15.339592671), z_dir=(0, 1, 0)), keep=Keep.TOP, mode=Mode.PRIVATE)
    fillet_1_piece_7 = fillet_1_piece_7a & fillet_1_piece_7b
    add(fillet_1_piece_7, mode=Mode.SUBTRACT)
    with BuildSketch(Plane(origin=(-13.5, 6.43, 15), x_dir=(1, 0, 0), z_dir=(0, 0, -1))) as fillet_1_piece_8a_section:
        with BuildLine():
            CenterArc((FILLET_1_R, -FILLET_1_R), FILLET_1_R, 90, 90)
            Line((0, -FILLET_1_R), (0, 0))
            Line((0, 0), (FILLET_1_R, 0))
        make_face()
    fillet_1_piece_8a = extrude(amount=33.75, mode=Mode.PRIVATE)
    fillet_1_piece_8a = split(fillet_1_piece_8a, bisect_by=Plane(origin=(-13.160407329, 6.769592671, -15), z_dir=(0, 0, -1)), keep=Keep.TOP, mode=Mode.PRIVATE)
    with BuildSketch(Plane(origin=(-13.5, 10.18, -15), x_dir=(1, 0, 0), z_dir=(0, -1, 0))) as fillet_1_piece_8b_section:
        with BuildLine():
            CenterArc((FILLET_1_R, -FILLET_1_R), FILLET_1_R, 90, 90)
            Line((0, -FILLET_1_R), (0, 0))
            Line((0, 0), (FILLET_1_R, 0))
        make_face()
    fillet_1_piece_8b = extrude(amount=8, mode=Mode.PRIVATE)
    fillet_1_piece_8b = split(fillet_1_piece_8b, bisect_by=Plane(origin=(-13.160407329, 6.43, -15.339592671), z_dir=(0, 1, 0)), keep=Keep.TOP, mode=Mode.PRIVATE)
    fillet_1_piece_8 = fillet_1_piece_8a & fillet_1_piece_8b
    add(fillet_1_piece_8, mode=Mode.SUBTRACT)
    with BuildSketch(Plane(origin=(-13.5, 6.43, 18.75), x_dir=(1, 0, 0), z_dir=(0, 0, -1))) as fillet_1_piece_9a_section:
        with BuildLine():
            CenterArc((FILLET_1_R, -FILLET_1_R), FILLET_1_R, 90, 90)
            Line((0, -FILLET_1_R), (0, 0))
            Line((0, 0), (FILLET_1_R, 0))
        make_face()
    fillet_1_piece_9a = extrude(amount=33.75, mode=Mode.PRIVATE)
    fillet_1_piece_9a = split(fillet_1_piece_9a, bisect_by=Plane(origin=(-13.160407329, 6.769592671, 15), z_dir=(0, 0, 1)), keep=Keep.TOP, mode=Mode.PRIVATE)
    with BuildSketch(Plane(origin=(-13.5, 10.18, 15), x_dir=(1, 0, 0), z_dir=(0, -1, 0))) as fillet_1_piece_9b_section:
        with BuildLine():
            CenterArc((FILLET_1_R, FILLET_1_R), FILLET_1_R, 180, 90)
            Line((0, FILLET_1_R), (0, 0))
            Line((0, 0), (FILLET_1_R, 0))
        make_face()
    fillet_1_piece_9b = extrude(amount=8, mode=Mode.PRIVATE)
    fillet_1_piece_9b = split(fillet_1_piece_9b, bisect_by=Plane(origin=(-13.160407329, 6.43, 15.339592671), z_dir=(0, 1, 0)), keep=Keep.TOP, mode=Mode.PRIVATE)
    fillet_1_piece_9 = fillet_1_piece_9a & fillet_1_piece_9b
    add(fillet_1_piece_9, mode=Mode.SUBTRACT)

    # Фаска1
    chamfer_1_edges = [part.edges().sort_by_distance(p)[0] for p in [
        (0, 9.43, 25),
        (-2.85, 10.93, 25),
        (2.85, 10.93, 25),
        (0, 12.43, 25),
        (0, 16, 18.4),
        (0, 16, -21.6),
        (-7.075, 16, -17.531827599),
        (-5.65, 16, -20),
        (-7.075, 16, -22.468172401),
        (-9.925, 16, -22.468172401),
        (-11.35, 16, -20),
        (-9.925, 16, -17.531827599),
        (8.5, 5.93, -21.6),
        (-8.5, 5.93, -21.6),
        (8.5, 5.93, 18.4),
        (-8.5, 5.93, 18.4),
        (9.925, 16, -17.531827599),
        (11.35, 16, -20),
        (9.925, 16, -22.468172401),
        (7.075, 16, -22.468172401),
        (5.65, 16, -20),
        (7.075, 16, -17.531827599),
        (9.925, 16, 22.468172401),
        (11.35, 16, 20),
        (9.925, 16, 17.531827599),
        (7.075, 16, 17.531827599),
        (5.65, 16, 20),
        (7.075, 16, 22.468172401),
        (-7.075, 16, 22.468172401),
        (-5.65, 16, 20),
        (-7.075, 16, 17.531827599),
        (-9.925, 16, 17.531827599),
        (-11.35, 16, 20),
        (-9.925, 16, 22.468172401),
        (-2.85, 10.93, -25),
        (0, 9.43, -25),
        (2.85, 10.93, -25),
        (0, 12.43, -25),
    ]]
    chamfer(chamfer_1_edges, length=CHAMFER_1_SIZE)


solid = part.part
